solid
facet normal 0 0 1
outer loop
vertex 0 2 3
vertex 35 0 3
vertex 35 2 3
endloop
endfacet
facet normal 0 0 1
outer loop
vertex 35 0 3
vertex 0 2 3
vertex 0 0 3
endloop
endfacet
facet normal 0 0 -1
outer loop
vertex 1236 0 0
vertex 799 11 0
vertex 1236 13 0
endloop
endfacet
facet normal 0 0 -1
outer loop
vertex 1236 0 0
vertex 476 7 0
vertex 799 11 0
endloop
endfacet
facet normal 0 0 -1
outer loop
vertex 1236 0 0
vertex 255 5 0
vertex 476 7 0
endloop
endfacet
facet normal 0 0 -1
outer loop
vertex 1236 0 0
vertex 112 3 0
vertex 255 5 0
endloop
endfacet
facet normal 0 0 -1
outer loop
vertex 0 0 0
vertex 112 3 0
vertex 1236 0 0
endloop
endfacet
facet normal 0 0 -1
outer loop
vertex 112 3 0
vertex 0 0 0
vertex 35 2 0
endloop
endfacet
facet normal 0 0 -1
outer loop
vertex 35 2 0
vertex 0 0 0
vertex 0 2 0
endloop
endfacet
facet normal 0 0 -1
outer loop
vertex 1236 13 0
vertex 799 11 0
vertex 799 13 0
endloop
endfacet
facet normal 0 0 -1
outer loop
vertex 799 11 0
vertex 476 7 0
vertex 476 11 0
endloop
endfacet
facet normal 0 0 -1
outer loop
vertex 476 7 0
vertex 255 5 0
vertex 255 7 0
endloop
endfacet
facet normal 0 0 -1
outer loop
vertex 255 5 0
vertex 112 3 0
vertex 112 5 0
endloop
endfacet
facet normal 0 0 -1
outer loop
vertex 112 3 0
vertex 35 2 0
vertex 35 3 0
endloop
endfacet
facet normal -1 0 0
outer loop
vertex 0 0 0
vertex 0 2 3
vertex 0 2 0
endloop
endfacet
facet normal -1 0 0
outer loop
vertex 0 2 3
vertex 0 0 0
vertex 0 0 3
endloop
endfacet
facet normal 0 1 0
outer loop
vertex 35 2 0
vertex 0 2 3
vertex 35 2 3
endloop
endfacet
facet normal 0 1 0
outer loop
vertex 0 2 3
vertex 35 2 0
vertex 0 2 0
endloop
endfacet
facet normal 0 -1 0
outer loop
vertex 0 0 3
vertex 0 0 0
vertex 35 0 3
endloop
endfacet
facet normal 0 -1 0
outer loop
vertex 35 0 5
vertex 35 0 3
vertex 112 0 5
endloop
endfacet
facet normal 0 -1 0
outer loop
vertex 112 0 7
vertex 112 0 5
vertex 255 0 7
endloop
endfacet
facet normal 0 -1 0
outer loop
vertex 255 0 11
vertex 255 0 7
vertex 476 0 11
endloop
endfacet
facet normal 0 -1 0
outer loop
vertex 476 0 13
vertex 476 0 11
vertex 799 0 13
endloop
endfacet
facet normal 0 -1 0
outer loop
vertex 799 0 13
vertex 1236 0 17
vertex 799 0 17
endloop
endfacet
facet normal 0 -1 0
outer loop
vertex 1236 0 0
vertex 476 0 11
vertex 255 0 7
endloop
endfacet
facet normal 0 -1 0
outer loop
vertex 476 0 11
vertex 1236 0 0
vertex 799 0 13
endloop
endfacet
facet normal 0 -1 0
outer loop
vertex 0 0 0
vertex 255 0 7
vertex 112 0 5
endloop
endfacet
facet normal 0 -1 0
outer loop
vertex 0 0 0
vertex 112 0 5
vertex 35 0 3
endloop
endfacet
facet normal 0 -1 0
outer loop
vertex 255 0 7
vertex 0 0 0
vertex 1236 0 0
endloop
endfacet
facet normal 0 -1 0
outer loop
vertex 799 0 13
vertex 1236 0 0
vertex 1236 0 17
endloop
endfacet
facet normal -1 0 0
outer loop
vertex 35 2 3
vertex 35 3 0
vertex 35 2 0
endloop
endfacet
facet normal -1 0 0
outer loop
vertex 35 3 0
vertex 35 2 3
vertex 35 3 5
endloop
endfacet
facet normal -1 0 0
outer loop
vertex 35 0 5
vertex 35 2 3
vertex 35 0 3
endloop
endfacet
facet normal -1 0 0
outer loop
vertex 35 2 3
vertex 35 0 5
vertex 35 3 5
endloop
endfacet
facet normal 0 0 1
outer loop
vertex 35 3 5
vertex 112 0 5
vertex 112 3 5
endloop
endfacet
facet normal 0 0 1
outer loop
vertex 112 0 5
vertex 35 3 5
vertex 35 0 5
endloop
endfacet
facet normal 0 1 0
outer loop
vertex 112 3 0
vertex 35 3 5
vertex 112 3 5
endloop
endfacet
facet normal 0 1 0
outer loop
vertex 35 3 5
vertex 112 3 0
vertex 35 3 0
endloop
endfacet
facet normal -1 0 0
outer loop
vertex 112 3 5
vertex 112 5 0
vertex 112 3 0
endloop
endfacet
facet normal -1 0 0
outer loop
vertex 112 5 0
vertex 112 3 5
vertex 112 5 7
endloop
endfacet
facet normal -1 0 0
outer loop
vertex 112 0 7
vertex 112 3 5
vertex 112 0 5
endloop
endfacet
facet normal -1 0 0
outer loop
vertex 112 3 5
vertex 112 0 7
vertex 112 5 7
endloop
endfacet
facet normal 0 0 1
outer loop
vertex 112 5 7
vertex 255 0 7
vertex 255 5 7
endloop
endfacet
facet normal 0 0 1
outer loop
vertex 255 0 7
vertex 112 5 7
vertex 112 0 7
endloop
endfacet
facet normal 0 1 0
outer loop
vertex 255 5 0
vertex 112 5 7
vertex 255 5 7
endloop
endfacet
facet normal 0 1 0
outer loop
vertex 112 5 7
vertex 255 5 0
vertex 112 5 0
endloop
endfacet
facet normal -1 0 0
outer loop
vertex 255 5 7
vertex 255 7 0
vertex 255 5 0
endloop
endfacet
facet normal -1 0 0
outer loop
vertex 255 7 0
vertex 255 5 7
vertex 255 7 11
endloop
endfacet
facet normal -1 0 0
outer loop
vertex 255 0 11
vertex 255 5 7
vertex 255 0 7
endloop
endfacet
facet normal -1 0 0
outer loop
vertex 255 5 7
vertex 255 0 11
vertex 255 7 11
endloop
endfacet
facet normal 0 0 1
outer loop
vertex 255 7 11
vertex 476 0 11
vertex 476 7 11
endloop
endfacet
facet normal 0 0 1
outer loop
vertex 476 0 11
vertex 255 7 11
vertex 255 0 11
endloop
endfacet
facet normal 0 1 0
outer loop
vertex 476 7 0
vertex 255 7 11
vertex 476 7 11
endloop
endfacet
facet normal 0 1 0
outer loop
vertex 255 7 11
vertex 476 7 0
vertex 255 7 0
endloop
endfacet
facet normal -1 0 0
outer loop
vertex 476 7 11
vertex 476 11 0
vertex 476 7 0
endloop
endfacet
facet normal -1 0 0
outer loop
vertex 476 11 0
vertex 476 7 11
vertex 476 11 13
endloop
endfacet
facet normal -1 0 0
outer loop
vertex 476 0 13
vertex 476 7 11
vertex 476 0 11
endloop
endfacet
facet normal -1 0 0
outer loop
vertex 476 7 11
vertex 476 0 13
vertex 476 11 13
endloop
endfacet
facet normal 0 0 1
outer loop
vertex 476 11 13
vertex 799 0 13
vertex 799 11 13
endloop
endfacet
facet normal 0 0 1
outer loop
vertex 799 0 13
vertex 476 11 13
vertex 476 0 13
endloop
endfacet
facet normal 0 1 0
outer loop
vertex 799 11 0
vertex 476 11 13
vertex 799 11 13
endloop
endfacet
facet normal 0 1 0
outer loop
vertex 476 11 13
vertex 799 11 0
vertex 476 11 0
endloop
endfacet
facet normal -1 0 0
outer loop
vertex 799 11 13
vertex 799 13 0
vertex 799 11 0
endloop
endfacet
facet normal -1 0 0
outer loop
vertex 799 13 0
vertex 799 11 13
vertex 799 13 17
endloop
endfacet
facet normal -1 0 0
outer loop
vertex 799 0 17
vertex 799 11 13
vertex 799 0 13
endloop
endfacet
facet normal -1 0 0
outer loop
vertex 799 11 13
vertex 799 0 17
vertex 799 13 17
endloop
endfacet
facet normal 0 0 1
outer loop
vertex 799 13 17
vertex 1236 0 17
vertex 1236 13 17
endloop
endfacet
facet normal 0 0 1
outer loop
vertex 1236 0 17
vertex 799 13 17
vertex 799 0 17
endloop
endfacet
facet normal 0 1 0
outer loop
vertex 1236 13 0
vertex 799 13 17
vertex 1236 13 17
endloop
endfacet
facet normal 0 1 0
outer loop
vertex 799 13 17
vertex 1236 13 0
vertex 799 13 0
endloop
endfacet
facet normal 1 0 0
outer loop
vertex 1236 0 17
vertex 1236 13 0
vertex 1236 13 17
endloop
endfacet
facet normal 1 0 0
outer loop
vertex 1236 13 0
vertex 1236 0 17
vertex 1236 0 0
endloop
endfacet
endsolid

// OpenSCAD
translate([2.5, 1.0, 1.5]) color([0.991228648099722, 0.13558077637136434, 0.20650423900368708]) cube([5, 2, 3], center=true);
translate([7.5, 1.0, 1.5]) color([0.9151210693627757, 0.49673738754911745, 0.7672539256192649]) cube([5, 2, 3], center=true);
translate([12.5, 1.0, 1.5]) color([0.969306850533619, 0.23531586477578126, 0.13212860983739783]) cube([5, 2, 3], center=true);
translate([17.5, 1.0, 1.5]) color([0.23368957459901674, 0.38460662479298113, 0.6084990843462054]) cube([5, 2, 3], center=true);
translate([22.5, 1.0, 1.5]) color([0.1325407149567407, 0.4984659545183915, 0.9178662904203972]) cube([5, 2, 3], center=true);
translate([27.5, 1.0, 1.5]) color([0.6160167741323543, 0.02601445858505036, 0.596125612844632]) cube([5, 2, 3], center=true);
translate([32.5, 1.0, 1.5]) color([0.48919913512172475, 0.30869925031539414, 0.9586301909392594]) cube([5, 2, 3], center=true);
translate([38.5, 1.5, 2.5]) color([0.5555224541780607, 0.16303723797834868, 0.8790785483620981]) cube([7, 3, 5], center=true);
translate([45.5, 1.5, 2.5]) color([0.8092366229990562, 0.7373715302416316, 0.5460288399006699]) cube([7, 3, 5], center=true);
translate([52.5, 1.5, 2.5]) color([0.7042240787132147, 0.07877233817546292, 0.13744427713979768]) cube([7, 3, 5], center=true);
translate([59.5, 1.5, 2.5]) color([0.40185422229333856, 0.1910666288561843, 0.31642065037316636]) cube([7, 3, 5], center=true);
translate([66.5, 1.5, 2.5]) color([0.2917281417853558, 0.9437754009602987, 0.20866341172373193]) cube([7, 3, 5], center=true);
translate([73.5, 1.5, 2.5]) color([0.3151573145870893, 0.7470721078045024, 0.24960896628473228]) cube([7, 3, 5], center=true);
translate([80.5, 1.5, 2.5]) color([0.8629627260654799, 0.6684326881602258, 0.6597695027130189]) cube([7, 3, 5], center=true);
translate([87.5, 1.5, 2.5]) color([0.22591717735012307, 0.3441717078654829, 0.16233220178561225]) cube([7, 3, 5], center=true);
translate([94.5, 1.5, 2.5]) color([0.01697652307419406, 0.5735931064152219, 0.05818297514553228]) cube([7, 3, 5], center=true);
translate([101.5, 1.5, 2.5]) color([0.6304378073753134, 0.35341956482818127, 0.49110709598533775]) cube([7, 3, 5], center=true);
translate([108.5, 1.5, 2.5]) color([0.06132304686728618, 0.24146702174069912, 0.012441234482642782]) cube([7, 3, 5], center=true);
translate([117.5, 2.5, 3.5]) color([0.9455344576677447, 0.3266678829978785, 0.820956849026723]) cube([11, 5, 7], center=true);
translate([128.5, 2.5, 3.5]) color([0.34492851027915805, 0.6639756368298299, 0.13585073420724958]) cube([11, 5, 7], center=true);
translate([139.5, 2.5, 3.5]) color([0.9219835342207869, 0.44896684911260887, 0.1420549627992148]) cube([11, 5, 7], center=true);
translate([150.5, 2.5, 3.5]) color([0.3119518323014343, 0.6490756968320398, 0.7280642389267371]) cube([11, 5, 7], center=true);
translate([161.5, 2.5, 3.5]) color([0.7852833252199665, 0.40863068686923587, 0.009633238682779877]) cube([11, 5, 7], center=true);
translate([172.5, 2.5, 3.5]) color([0.8909238596539266, 0.533705581213062, 0.8046005274030336]) cube([11, 5, 7], center=true);
translate([183.5, 2.5, 3.5]) color([0.9806276909012095, 0.7049346898693578, 0.7590860206033218]) cube([11, 5, 7], center=true);
translate([194.5, 2.5, 3.5]) color([0.5647284680717275, 0.12259546226958773, 0.9539533584587191]) cube([11, 5, 7], center=true);
translate([205.5, 2.5, 3.5]) color([0.1713156178825357, 0.5005542720722199, 0.621843985236089]) cube([11, 5, 7], center=true);
translate([216.5, 2.5, 3.5]) color([0.6619765424276485, 0.8400519693824264, 0.699601591737329]) cube([11, 5, 7], center=true);
translate([227.5, 2.5, 3.5]) color([0.07964741684534404, 0.23738047361475634, 0.8282556520451495]) cube([11, 5, 7], center=true);
translate([238.5, 2.5, 3.5]) color([0.1762738246231843, 0.9459581227747745, 0.9565644324307663]) cube([11, 5, 7], center=true);
translate([249.5, 2.5, 3.5]) color([0.8963269305888116, 0.7428117304122551, 0.8383436924491765]) cube([11, 5, 7], center=true);
translate([261.5, 3.5, 5.5]) color([0.5614087817692366, 0.7177928021437573, 0.4271772721979724]) cube([13, 7, 11], center=true);
translate([274.5, 3.5, 5.5]) color([0.8646648421725511, 0.10365846470378459, 0.6285317276232824]) cube([13, 7, 11], center=true);
translate([287.5, 3.5, 5.5]) color([0.7101075213407797, 0.6149371087697887, 0.0400488022899097]) cube([13, 7, 11], center=true);
translate([300.5, 3.5, 5.5]) color([0.34025031183581533, 0.7380159626358669, 0.3765176313166855]) cube([13, 7, 11], center=true);
translate([313.5, 3.5, 5.5]) color([0.6257641682954356, 0.8894786539399329, 0.4963449395419606]) cube([13, 7, 11], center=true);
translate([326.5, 3.5, 5.5]) color([0.3583651728386771, 0.6716454412848432, 0.45811681625355094]) cube([13, 7, 11], center=true);
translate([339.5, 3.5, 5.5]) color([0.5074379917667022, 0.16228475224599026, 0.7529781863444399]) cube([13, 7, 11], center=true);
translate([352.5, 3.5, 5.5]) color([0.3376457636791449, 0.8033239356600728, 0.9444207727357242]) cube([13, 7, 11], center=true);
translate([365.5, 3.5, 5.5]) color([0.014783921172948133, 0.5303420268039528, 0.2882277186993394]) cube([13, 7, 11], center=true);
translate([378.5, 3.5, 5.5]) color([0.4689175335863792, 0.03492832759702502, 0.5317931441254861]) cube([13, 7, 11], center=true);
translate([391.5, 3.5, 5.5]) color([0.552095437515129, 0.9340898594770107, 0.03830085289416996]) cube([13, 7, 11], center=true);
translate([404.5, 3.5, 5.5]) color([0.3950652682884612, 0.1200155720396251, 0.34658884626630715]) cube([13, 7, 11], center=true);
translate([417.5, 3.5, 5.5]) color([0.051152415727703016, 0.2730496953424699, 0.9956802504828091]) cube([13, 7, 11], center=true);
translate([430.5, 3.5, 5.5]) color([0.25391998649183944, 0.6803935586065328, 0.7027090324157298]) cube([13, 7, 11], center=true);
translate([443.5, 3.5, 5.5]) color([0.9291230685247301, 0.9949404722907454, 0.7620813713006523]) cube([13, 7, 11], center=true);
translate([456.5, 3.5, 5.5]) color([0.7625973189567923, 0.5162610213479427, 0.3860717563215982]) cube([13, 7, 11], center=true);
translate([469.5, 3.5, 5.5]) color([0.8343975914408754, 0.2506337702942619, 0.11599539642064438]) cube([13, 7, 11], center=true);
translate([484.5, 5.5, 6.5]) color([0.9817240858781537, 0.8047994372884794, 0.9431012043694105]) cube([17, 11, 13], center=true);
translate([501.5, 5.5, 6.5]) color([0.24264659424234813, 0.6738638931519124, 0.5327800265053269]) cube([17, 11, 13], center=true);
translate([518.5, 5.5, 6.5]) color([0.8756440829735669, 0.16255101499230828, 0.8680483691353614]) cube([17, 11, 13], center=true);
translate([535.5, 5.5, 6.5]) color([0.15305579700066485, 0.8462165202751376, 0.8200801239095041]) cube([17, 11, 13], center=true);
translate([552.5, 5.5, 6.5]) color([0.5849326984313064, 0.05125489506773162, 0.156166769208809]) cube([17, 11, 13], center=true);
translate([569.5, 5.5, 6.5]) color([0.34458118202681143, 0.291190613997825, 0.29342424365134856]) cube([17, 11, 13], center=true);
translate([586.5, 5.5, 6.5]) color([0.49485912757206985, 0.40365829021262367, 0.43100562682353716]) cube([17, 11, 13], center=true);
translate([603.5, 5.5, 6.5]) color([0.17003546655932655, 0.788340085303476, 0.5686027559906347]) cube([17, 11, 13], center=true);
translate([620.5, 5.5, 6.5]) color([0.44188886974638586, 0.3413461590512491, 0.009317740415098474]) cube([17, 11, 13], center=true);
translate([637.5, 5.5, 6.5]) color([0.72162474304745, 0.9099060293040379, 0.6642090292154819]) cube([17, 11, 13], center=true);
translate([654.5, 5.5, 6.5]) color([0.6628365798191557, 0.2575988974219705, 0.6122127561841502]) cube([17, 11, 13], center=true);
translate([671.5, 5.5, 6.5]) color([0.07024606726227145, 0.936077955543095, 0.27870721332570936]) cube([17, 11, 13], center=true);
translate([688.5, 5.5, 6.5]) color([0.8301443917589898, 0.5295296249528143, 0.06328696503387199]) cube([17, 11, 13], center=true);
translate([705.5, 5.5, 6.5]) color([0.639390097241117, 0.579686955437464, 0.9416538141960143]) cube([17, 11, 13], center=true);
translate([722.5, 5.5, 6.5]) color([0.6321291610349786, 0.5434228748459046, 0.38469874676133664]) cube([17, 11, 13], center=true);
translate([739.5, 5.5, 6.5]) color([0.434637548519362, 0.31139777068021024, 0.01363511702942577]) cube([17, 11, 13], center=true);
translate([756.5, 5.5, 6.5]) color([0.7785312160167684, 0.8197509625398982, 0.28044077713976767]) cube([17, 11, 13], center=true);
translate([773.5, 5.5, 6.5]) color([0.2581907625337724, 0.5272652548146236, 0.3179301097250754]) cube([17, 11, 13], center=true);
translate([790.5, 5.5, 6.5]) color([0.3422638341038545, 0.7055726929201963, 0.43169639849300545]) cube([17, 11, 13], center=true);
translate([808.5, 6.5, 8.5]) color([0.14170724037842175, 0.0059275683019511805, 0.5113413643489257]) cube([19, 13, 17], center=true);
translate([827.5, 6.5, 8.5]) color([0.7846494738841625, 0.7013909140505133, 0.7815279332048084]) cube([19, 13, 17], center=true);
translate([846.5, 6.5, 8.5]) color([0.38414456219182536, 0.4641305725985776, 0.036369164001931575]) cube([19, 13, 17], center=true);
translate([865.5, 6.5, 8.5]) color([0.9124290899309246, 0.6366653413633517, 0.798477007479407]) cube([19, 13, 17], center=true);
translate([884.5, 6.5, 8.5]) color([0.7602358551941967, 0.899814300356001, 0.3622224295816935]) cube([19, 13, 17], center=true);
translate([903.5, 6.5, 8.5]) color([0.9815510059994267, 0.15851660579635174, 0.19450942151924966]) cube([19, 13, 17], center=true);
translate([922.5, 6.5, 8.5]) color([0.35447317829590397, 0.700089123077614, 0.019141470871264166]) cube([19, 13, 17], center=true);
translate([941.5, 6.5, 8.5]) color([0.7352582011311831, 0.5715587801616956, 0.24207966979200135]) cube([19, 13, 17], center=true);
translate([960.5, 6.5, 8.5]) color([0.18514161515939986, 0.7580746928341441, 0.4199819570625165]) cube([19, 13, 17], center=true);
translate([979.5, 6.5, 8.5]) color([0.5731405723704375, 0.23673356878784502, 0.7138158488992904]) cube([19, 13, 17], center=true);
translate([998.5, 6.5, 8.5]) color([0.8637627475626694, 0.8949592620642776, 0.8103115760161889]) cube([19, 13, 17], center=true);
translate([1017.5, 6.5, 8.5]) color([0.1004216369837837, 0.18827941391234093, 0.44049583318501173]) cube([19, 13, 17], center=true);
translate([1036.5, 6.5, 8.5]) color([0.06522983258952386, 0.42674703623912436, 0.3947422574489625]) cube([19, 13, 17], center=true);
translate([1055.5, 6.5, 8.5]) color([0.27185274848852736, 0.43721657158275895, 0.7577296702077931]) cube([19, 13, 17], center=true);
translate([1074.5, 6.5, 8.5]) color([0.3561631337530091, 0.3277620307403001, 0.30701912216942273]) cube([19, 13, 17], center=true);
translate([1093.5, 6.5, 8.5]) color([0.492518074892234, 0.7625268269371841, 0.2027877178963453]) cube([19, 13, 17], center=true);
translate([1112.5, 6.5, 8.5]) color([0.39789846082497404, 0.4356119392473006, 0.6353731723550147]) cube([19, 13, 17], center=true);
translate([1131.5, 6.5, 8.5]) color([0.673076446274384, 0.6970991483341651, 0.8225488218547198]) cube([19, 13, 17], center=true);
translate([1150.5, 6.5, 8.5]) color([0.5826892216899469, 0.3545830833155835, 0.5687886411459258]) cube([19, 13, 17], center=true);
translate([1169.5, 6.5, 8.5]) color([0.564415288794693, 0.2783497745403337, 0.8220051901362931]) cube([19, 13, 17], center=true);
translate([1188.5, 6.5, 8.5]) color([0.39809270556066123, 0.9209203386432881, 0.13533998311747797]) cube([19, 13, 17], center=true);
translate([1207.5, 6.5, 8.5]) color([0.08148203466772541, 0.8649487446802395, 0.36102136972914045]) cube([19, 13, 17], center=true);
translate([1226.5, 6.5, 8.5]) color([0.06937329613248533, 0.7172877126247486, 0.671396341477498]) cube([19, 13, 17], center=true);
